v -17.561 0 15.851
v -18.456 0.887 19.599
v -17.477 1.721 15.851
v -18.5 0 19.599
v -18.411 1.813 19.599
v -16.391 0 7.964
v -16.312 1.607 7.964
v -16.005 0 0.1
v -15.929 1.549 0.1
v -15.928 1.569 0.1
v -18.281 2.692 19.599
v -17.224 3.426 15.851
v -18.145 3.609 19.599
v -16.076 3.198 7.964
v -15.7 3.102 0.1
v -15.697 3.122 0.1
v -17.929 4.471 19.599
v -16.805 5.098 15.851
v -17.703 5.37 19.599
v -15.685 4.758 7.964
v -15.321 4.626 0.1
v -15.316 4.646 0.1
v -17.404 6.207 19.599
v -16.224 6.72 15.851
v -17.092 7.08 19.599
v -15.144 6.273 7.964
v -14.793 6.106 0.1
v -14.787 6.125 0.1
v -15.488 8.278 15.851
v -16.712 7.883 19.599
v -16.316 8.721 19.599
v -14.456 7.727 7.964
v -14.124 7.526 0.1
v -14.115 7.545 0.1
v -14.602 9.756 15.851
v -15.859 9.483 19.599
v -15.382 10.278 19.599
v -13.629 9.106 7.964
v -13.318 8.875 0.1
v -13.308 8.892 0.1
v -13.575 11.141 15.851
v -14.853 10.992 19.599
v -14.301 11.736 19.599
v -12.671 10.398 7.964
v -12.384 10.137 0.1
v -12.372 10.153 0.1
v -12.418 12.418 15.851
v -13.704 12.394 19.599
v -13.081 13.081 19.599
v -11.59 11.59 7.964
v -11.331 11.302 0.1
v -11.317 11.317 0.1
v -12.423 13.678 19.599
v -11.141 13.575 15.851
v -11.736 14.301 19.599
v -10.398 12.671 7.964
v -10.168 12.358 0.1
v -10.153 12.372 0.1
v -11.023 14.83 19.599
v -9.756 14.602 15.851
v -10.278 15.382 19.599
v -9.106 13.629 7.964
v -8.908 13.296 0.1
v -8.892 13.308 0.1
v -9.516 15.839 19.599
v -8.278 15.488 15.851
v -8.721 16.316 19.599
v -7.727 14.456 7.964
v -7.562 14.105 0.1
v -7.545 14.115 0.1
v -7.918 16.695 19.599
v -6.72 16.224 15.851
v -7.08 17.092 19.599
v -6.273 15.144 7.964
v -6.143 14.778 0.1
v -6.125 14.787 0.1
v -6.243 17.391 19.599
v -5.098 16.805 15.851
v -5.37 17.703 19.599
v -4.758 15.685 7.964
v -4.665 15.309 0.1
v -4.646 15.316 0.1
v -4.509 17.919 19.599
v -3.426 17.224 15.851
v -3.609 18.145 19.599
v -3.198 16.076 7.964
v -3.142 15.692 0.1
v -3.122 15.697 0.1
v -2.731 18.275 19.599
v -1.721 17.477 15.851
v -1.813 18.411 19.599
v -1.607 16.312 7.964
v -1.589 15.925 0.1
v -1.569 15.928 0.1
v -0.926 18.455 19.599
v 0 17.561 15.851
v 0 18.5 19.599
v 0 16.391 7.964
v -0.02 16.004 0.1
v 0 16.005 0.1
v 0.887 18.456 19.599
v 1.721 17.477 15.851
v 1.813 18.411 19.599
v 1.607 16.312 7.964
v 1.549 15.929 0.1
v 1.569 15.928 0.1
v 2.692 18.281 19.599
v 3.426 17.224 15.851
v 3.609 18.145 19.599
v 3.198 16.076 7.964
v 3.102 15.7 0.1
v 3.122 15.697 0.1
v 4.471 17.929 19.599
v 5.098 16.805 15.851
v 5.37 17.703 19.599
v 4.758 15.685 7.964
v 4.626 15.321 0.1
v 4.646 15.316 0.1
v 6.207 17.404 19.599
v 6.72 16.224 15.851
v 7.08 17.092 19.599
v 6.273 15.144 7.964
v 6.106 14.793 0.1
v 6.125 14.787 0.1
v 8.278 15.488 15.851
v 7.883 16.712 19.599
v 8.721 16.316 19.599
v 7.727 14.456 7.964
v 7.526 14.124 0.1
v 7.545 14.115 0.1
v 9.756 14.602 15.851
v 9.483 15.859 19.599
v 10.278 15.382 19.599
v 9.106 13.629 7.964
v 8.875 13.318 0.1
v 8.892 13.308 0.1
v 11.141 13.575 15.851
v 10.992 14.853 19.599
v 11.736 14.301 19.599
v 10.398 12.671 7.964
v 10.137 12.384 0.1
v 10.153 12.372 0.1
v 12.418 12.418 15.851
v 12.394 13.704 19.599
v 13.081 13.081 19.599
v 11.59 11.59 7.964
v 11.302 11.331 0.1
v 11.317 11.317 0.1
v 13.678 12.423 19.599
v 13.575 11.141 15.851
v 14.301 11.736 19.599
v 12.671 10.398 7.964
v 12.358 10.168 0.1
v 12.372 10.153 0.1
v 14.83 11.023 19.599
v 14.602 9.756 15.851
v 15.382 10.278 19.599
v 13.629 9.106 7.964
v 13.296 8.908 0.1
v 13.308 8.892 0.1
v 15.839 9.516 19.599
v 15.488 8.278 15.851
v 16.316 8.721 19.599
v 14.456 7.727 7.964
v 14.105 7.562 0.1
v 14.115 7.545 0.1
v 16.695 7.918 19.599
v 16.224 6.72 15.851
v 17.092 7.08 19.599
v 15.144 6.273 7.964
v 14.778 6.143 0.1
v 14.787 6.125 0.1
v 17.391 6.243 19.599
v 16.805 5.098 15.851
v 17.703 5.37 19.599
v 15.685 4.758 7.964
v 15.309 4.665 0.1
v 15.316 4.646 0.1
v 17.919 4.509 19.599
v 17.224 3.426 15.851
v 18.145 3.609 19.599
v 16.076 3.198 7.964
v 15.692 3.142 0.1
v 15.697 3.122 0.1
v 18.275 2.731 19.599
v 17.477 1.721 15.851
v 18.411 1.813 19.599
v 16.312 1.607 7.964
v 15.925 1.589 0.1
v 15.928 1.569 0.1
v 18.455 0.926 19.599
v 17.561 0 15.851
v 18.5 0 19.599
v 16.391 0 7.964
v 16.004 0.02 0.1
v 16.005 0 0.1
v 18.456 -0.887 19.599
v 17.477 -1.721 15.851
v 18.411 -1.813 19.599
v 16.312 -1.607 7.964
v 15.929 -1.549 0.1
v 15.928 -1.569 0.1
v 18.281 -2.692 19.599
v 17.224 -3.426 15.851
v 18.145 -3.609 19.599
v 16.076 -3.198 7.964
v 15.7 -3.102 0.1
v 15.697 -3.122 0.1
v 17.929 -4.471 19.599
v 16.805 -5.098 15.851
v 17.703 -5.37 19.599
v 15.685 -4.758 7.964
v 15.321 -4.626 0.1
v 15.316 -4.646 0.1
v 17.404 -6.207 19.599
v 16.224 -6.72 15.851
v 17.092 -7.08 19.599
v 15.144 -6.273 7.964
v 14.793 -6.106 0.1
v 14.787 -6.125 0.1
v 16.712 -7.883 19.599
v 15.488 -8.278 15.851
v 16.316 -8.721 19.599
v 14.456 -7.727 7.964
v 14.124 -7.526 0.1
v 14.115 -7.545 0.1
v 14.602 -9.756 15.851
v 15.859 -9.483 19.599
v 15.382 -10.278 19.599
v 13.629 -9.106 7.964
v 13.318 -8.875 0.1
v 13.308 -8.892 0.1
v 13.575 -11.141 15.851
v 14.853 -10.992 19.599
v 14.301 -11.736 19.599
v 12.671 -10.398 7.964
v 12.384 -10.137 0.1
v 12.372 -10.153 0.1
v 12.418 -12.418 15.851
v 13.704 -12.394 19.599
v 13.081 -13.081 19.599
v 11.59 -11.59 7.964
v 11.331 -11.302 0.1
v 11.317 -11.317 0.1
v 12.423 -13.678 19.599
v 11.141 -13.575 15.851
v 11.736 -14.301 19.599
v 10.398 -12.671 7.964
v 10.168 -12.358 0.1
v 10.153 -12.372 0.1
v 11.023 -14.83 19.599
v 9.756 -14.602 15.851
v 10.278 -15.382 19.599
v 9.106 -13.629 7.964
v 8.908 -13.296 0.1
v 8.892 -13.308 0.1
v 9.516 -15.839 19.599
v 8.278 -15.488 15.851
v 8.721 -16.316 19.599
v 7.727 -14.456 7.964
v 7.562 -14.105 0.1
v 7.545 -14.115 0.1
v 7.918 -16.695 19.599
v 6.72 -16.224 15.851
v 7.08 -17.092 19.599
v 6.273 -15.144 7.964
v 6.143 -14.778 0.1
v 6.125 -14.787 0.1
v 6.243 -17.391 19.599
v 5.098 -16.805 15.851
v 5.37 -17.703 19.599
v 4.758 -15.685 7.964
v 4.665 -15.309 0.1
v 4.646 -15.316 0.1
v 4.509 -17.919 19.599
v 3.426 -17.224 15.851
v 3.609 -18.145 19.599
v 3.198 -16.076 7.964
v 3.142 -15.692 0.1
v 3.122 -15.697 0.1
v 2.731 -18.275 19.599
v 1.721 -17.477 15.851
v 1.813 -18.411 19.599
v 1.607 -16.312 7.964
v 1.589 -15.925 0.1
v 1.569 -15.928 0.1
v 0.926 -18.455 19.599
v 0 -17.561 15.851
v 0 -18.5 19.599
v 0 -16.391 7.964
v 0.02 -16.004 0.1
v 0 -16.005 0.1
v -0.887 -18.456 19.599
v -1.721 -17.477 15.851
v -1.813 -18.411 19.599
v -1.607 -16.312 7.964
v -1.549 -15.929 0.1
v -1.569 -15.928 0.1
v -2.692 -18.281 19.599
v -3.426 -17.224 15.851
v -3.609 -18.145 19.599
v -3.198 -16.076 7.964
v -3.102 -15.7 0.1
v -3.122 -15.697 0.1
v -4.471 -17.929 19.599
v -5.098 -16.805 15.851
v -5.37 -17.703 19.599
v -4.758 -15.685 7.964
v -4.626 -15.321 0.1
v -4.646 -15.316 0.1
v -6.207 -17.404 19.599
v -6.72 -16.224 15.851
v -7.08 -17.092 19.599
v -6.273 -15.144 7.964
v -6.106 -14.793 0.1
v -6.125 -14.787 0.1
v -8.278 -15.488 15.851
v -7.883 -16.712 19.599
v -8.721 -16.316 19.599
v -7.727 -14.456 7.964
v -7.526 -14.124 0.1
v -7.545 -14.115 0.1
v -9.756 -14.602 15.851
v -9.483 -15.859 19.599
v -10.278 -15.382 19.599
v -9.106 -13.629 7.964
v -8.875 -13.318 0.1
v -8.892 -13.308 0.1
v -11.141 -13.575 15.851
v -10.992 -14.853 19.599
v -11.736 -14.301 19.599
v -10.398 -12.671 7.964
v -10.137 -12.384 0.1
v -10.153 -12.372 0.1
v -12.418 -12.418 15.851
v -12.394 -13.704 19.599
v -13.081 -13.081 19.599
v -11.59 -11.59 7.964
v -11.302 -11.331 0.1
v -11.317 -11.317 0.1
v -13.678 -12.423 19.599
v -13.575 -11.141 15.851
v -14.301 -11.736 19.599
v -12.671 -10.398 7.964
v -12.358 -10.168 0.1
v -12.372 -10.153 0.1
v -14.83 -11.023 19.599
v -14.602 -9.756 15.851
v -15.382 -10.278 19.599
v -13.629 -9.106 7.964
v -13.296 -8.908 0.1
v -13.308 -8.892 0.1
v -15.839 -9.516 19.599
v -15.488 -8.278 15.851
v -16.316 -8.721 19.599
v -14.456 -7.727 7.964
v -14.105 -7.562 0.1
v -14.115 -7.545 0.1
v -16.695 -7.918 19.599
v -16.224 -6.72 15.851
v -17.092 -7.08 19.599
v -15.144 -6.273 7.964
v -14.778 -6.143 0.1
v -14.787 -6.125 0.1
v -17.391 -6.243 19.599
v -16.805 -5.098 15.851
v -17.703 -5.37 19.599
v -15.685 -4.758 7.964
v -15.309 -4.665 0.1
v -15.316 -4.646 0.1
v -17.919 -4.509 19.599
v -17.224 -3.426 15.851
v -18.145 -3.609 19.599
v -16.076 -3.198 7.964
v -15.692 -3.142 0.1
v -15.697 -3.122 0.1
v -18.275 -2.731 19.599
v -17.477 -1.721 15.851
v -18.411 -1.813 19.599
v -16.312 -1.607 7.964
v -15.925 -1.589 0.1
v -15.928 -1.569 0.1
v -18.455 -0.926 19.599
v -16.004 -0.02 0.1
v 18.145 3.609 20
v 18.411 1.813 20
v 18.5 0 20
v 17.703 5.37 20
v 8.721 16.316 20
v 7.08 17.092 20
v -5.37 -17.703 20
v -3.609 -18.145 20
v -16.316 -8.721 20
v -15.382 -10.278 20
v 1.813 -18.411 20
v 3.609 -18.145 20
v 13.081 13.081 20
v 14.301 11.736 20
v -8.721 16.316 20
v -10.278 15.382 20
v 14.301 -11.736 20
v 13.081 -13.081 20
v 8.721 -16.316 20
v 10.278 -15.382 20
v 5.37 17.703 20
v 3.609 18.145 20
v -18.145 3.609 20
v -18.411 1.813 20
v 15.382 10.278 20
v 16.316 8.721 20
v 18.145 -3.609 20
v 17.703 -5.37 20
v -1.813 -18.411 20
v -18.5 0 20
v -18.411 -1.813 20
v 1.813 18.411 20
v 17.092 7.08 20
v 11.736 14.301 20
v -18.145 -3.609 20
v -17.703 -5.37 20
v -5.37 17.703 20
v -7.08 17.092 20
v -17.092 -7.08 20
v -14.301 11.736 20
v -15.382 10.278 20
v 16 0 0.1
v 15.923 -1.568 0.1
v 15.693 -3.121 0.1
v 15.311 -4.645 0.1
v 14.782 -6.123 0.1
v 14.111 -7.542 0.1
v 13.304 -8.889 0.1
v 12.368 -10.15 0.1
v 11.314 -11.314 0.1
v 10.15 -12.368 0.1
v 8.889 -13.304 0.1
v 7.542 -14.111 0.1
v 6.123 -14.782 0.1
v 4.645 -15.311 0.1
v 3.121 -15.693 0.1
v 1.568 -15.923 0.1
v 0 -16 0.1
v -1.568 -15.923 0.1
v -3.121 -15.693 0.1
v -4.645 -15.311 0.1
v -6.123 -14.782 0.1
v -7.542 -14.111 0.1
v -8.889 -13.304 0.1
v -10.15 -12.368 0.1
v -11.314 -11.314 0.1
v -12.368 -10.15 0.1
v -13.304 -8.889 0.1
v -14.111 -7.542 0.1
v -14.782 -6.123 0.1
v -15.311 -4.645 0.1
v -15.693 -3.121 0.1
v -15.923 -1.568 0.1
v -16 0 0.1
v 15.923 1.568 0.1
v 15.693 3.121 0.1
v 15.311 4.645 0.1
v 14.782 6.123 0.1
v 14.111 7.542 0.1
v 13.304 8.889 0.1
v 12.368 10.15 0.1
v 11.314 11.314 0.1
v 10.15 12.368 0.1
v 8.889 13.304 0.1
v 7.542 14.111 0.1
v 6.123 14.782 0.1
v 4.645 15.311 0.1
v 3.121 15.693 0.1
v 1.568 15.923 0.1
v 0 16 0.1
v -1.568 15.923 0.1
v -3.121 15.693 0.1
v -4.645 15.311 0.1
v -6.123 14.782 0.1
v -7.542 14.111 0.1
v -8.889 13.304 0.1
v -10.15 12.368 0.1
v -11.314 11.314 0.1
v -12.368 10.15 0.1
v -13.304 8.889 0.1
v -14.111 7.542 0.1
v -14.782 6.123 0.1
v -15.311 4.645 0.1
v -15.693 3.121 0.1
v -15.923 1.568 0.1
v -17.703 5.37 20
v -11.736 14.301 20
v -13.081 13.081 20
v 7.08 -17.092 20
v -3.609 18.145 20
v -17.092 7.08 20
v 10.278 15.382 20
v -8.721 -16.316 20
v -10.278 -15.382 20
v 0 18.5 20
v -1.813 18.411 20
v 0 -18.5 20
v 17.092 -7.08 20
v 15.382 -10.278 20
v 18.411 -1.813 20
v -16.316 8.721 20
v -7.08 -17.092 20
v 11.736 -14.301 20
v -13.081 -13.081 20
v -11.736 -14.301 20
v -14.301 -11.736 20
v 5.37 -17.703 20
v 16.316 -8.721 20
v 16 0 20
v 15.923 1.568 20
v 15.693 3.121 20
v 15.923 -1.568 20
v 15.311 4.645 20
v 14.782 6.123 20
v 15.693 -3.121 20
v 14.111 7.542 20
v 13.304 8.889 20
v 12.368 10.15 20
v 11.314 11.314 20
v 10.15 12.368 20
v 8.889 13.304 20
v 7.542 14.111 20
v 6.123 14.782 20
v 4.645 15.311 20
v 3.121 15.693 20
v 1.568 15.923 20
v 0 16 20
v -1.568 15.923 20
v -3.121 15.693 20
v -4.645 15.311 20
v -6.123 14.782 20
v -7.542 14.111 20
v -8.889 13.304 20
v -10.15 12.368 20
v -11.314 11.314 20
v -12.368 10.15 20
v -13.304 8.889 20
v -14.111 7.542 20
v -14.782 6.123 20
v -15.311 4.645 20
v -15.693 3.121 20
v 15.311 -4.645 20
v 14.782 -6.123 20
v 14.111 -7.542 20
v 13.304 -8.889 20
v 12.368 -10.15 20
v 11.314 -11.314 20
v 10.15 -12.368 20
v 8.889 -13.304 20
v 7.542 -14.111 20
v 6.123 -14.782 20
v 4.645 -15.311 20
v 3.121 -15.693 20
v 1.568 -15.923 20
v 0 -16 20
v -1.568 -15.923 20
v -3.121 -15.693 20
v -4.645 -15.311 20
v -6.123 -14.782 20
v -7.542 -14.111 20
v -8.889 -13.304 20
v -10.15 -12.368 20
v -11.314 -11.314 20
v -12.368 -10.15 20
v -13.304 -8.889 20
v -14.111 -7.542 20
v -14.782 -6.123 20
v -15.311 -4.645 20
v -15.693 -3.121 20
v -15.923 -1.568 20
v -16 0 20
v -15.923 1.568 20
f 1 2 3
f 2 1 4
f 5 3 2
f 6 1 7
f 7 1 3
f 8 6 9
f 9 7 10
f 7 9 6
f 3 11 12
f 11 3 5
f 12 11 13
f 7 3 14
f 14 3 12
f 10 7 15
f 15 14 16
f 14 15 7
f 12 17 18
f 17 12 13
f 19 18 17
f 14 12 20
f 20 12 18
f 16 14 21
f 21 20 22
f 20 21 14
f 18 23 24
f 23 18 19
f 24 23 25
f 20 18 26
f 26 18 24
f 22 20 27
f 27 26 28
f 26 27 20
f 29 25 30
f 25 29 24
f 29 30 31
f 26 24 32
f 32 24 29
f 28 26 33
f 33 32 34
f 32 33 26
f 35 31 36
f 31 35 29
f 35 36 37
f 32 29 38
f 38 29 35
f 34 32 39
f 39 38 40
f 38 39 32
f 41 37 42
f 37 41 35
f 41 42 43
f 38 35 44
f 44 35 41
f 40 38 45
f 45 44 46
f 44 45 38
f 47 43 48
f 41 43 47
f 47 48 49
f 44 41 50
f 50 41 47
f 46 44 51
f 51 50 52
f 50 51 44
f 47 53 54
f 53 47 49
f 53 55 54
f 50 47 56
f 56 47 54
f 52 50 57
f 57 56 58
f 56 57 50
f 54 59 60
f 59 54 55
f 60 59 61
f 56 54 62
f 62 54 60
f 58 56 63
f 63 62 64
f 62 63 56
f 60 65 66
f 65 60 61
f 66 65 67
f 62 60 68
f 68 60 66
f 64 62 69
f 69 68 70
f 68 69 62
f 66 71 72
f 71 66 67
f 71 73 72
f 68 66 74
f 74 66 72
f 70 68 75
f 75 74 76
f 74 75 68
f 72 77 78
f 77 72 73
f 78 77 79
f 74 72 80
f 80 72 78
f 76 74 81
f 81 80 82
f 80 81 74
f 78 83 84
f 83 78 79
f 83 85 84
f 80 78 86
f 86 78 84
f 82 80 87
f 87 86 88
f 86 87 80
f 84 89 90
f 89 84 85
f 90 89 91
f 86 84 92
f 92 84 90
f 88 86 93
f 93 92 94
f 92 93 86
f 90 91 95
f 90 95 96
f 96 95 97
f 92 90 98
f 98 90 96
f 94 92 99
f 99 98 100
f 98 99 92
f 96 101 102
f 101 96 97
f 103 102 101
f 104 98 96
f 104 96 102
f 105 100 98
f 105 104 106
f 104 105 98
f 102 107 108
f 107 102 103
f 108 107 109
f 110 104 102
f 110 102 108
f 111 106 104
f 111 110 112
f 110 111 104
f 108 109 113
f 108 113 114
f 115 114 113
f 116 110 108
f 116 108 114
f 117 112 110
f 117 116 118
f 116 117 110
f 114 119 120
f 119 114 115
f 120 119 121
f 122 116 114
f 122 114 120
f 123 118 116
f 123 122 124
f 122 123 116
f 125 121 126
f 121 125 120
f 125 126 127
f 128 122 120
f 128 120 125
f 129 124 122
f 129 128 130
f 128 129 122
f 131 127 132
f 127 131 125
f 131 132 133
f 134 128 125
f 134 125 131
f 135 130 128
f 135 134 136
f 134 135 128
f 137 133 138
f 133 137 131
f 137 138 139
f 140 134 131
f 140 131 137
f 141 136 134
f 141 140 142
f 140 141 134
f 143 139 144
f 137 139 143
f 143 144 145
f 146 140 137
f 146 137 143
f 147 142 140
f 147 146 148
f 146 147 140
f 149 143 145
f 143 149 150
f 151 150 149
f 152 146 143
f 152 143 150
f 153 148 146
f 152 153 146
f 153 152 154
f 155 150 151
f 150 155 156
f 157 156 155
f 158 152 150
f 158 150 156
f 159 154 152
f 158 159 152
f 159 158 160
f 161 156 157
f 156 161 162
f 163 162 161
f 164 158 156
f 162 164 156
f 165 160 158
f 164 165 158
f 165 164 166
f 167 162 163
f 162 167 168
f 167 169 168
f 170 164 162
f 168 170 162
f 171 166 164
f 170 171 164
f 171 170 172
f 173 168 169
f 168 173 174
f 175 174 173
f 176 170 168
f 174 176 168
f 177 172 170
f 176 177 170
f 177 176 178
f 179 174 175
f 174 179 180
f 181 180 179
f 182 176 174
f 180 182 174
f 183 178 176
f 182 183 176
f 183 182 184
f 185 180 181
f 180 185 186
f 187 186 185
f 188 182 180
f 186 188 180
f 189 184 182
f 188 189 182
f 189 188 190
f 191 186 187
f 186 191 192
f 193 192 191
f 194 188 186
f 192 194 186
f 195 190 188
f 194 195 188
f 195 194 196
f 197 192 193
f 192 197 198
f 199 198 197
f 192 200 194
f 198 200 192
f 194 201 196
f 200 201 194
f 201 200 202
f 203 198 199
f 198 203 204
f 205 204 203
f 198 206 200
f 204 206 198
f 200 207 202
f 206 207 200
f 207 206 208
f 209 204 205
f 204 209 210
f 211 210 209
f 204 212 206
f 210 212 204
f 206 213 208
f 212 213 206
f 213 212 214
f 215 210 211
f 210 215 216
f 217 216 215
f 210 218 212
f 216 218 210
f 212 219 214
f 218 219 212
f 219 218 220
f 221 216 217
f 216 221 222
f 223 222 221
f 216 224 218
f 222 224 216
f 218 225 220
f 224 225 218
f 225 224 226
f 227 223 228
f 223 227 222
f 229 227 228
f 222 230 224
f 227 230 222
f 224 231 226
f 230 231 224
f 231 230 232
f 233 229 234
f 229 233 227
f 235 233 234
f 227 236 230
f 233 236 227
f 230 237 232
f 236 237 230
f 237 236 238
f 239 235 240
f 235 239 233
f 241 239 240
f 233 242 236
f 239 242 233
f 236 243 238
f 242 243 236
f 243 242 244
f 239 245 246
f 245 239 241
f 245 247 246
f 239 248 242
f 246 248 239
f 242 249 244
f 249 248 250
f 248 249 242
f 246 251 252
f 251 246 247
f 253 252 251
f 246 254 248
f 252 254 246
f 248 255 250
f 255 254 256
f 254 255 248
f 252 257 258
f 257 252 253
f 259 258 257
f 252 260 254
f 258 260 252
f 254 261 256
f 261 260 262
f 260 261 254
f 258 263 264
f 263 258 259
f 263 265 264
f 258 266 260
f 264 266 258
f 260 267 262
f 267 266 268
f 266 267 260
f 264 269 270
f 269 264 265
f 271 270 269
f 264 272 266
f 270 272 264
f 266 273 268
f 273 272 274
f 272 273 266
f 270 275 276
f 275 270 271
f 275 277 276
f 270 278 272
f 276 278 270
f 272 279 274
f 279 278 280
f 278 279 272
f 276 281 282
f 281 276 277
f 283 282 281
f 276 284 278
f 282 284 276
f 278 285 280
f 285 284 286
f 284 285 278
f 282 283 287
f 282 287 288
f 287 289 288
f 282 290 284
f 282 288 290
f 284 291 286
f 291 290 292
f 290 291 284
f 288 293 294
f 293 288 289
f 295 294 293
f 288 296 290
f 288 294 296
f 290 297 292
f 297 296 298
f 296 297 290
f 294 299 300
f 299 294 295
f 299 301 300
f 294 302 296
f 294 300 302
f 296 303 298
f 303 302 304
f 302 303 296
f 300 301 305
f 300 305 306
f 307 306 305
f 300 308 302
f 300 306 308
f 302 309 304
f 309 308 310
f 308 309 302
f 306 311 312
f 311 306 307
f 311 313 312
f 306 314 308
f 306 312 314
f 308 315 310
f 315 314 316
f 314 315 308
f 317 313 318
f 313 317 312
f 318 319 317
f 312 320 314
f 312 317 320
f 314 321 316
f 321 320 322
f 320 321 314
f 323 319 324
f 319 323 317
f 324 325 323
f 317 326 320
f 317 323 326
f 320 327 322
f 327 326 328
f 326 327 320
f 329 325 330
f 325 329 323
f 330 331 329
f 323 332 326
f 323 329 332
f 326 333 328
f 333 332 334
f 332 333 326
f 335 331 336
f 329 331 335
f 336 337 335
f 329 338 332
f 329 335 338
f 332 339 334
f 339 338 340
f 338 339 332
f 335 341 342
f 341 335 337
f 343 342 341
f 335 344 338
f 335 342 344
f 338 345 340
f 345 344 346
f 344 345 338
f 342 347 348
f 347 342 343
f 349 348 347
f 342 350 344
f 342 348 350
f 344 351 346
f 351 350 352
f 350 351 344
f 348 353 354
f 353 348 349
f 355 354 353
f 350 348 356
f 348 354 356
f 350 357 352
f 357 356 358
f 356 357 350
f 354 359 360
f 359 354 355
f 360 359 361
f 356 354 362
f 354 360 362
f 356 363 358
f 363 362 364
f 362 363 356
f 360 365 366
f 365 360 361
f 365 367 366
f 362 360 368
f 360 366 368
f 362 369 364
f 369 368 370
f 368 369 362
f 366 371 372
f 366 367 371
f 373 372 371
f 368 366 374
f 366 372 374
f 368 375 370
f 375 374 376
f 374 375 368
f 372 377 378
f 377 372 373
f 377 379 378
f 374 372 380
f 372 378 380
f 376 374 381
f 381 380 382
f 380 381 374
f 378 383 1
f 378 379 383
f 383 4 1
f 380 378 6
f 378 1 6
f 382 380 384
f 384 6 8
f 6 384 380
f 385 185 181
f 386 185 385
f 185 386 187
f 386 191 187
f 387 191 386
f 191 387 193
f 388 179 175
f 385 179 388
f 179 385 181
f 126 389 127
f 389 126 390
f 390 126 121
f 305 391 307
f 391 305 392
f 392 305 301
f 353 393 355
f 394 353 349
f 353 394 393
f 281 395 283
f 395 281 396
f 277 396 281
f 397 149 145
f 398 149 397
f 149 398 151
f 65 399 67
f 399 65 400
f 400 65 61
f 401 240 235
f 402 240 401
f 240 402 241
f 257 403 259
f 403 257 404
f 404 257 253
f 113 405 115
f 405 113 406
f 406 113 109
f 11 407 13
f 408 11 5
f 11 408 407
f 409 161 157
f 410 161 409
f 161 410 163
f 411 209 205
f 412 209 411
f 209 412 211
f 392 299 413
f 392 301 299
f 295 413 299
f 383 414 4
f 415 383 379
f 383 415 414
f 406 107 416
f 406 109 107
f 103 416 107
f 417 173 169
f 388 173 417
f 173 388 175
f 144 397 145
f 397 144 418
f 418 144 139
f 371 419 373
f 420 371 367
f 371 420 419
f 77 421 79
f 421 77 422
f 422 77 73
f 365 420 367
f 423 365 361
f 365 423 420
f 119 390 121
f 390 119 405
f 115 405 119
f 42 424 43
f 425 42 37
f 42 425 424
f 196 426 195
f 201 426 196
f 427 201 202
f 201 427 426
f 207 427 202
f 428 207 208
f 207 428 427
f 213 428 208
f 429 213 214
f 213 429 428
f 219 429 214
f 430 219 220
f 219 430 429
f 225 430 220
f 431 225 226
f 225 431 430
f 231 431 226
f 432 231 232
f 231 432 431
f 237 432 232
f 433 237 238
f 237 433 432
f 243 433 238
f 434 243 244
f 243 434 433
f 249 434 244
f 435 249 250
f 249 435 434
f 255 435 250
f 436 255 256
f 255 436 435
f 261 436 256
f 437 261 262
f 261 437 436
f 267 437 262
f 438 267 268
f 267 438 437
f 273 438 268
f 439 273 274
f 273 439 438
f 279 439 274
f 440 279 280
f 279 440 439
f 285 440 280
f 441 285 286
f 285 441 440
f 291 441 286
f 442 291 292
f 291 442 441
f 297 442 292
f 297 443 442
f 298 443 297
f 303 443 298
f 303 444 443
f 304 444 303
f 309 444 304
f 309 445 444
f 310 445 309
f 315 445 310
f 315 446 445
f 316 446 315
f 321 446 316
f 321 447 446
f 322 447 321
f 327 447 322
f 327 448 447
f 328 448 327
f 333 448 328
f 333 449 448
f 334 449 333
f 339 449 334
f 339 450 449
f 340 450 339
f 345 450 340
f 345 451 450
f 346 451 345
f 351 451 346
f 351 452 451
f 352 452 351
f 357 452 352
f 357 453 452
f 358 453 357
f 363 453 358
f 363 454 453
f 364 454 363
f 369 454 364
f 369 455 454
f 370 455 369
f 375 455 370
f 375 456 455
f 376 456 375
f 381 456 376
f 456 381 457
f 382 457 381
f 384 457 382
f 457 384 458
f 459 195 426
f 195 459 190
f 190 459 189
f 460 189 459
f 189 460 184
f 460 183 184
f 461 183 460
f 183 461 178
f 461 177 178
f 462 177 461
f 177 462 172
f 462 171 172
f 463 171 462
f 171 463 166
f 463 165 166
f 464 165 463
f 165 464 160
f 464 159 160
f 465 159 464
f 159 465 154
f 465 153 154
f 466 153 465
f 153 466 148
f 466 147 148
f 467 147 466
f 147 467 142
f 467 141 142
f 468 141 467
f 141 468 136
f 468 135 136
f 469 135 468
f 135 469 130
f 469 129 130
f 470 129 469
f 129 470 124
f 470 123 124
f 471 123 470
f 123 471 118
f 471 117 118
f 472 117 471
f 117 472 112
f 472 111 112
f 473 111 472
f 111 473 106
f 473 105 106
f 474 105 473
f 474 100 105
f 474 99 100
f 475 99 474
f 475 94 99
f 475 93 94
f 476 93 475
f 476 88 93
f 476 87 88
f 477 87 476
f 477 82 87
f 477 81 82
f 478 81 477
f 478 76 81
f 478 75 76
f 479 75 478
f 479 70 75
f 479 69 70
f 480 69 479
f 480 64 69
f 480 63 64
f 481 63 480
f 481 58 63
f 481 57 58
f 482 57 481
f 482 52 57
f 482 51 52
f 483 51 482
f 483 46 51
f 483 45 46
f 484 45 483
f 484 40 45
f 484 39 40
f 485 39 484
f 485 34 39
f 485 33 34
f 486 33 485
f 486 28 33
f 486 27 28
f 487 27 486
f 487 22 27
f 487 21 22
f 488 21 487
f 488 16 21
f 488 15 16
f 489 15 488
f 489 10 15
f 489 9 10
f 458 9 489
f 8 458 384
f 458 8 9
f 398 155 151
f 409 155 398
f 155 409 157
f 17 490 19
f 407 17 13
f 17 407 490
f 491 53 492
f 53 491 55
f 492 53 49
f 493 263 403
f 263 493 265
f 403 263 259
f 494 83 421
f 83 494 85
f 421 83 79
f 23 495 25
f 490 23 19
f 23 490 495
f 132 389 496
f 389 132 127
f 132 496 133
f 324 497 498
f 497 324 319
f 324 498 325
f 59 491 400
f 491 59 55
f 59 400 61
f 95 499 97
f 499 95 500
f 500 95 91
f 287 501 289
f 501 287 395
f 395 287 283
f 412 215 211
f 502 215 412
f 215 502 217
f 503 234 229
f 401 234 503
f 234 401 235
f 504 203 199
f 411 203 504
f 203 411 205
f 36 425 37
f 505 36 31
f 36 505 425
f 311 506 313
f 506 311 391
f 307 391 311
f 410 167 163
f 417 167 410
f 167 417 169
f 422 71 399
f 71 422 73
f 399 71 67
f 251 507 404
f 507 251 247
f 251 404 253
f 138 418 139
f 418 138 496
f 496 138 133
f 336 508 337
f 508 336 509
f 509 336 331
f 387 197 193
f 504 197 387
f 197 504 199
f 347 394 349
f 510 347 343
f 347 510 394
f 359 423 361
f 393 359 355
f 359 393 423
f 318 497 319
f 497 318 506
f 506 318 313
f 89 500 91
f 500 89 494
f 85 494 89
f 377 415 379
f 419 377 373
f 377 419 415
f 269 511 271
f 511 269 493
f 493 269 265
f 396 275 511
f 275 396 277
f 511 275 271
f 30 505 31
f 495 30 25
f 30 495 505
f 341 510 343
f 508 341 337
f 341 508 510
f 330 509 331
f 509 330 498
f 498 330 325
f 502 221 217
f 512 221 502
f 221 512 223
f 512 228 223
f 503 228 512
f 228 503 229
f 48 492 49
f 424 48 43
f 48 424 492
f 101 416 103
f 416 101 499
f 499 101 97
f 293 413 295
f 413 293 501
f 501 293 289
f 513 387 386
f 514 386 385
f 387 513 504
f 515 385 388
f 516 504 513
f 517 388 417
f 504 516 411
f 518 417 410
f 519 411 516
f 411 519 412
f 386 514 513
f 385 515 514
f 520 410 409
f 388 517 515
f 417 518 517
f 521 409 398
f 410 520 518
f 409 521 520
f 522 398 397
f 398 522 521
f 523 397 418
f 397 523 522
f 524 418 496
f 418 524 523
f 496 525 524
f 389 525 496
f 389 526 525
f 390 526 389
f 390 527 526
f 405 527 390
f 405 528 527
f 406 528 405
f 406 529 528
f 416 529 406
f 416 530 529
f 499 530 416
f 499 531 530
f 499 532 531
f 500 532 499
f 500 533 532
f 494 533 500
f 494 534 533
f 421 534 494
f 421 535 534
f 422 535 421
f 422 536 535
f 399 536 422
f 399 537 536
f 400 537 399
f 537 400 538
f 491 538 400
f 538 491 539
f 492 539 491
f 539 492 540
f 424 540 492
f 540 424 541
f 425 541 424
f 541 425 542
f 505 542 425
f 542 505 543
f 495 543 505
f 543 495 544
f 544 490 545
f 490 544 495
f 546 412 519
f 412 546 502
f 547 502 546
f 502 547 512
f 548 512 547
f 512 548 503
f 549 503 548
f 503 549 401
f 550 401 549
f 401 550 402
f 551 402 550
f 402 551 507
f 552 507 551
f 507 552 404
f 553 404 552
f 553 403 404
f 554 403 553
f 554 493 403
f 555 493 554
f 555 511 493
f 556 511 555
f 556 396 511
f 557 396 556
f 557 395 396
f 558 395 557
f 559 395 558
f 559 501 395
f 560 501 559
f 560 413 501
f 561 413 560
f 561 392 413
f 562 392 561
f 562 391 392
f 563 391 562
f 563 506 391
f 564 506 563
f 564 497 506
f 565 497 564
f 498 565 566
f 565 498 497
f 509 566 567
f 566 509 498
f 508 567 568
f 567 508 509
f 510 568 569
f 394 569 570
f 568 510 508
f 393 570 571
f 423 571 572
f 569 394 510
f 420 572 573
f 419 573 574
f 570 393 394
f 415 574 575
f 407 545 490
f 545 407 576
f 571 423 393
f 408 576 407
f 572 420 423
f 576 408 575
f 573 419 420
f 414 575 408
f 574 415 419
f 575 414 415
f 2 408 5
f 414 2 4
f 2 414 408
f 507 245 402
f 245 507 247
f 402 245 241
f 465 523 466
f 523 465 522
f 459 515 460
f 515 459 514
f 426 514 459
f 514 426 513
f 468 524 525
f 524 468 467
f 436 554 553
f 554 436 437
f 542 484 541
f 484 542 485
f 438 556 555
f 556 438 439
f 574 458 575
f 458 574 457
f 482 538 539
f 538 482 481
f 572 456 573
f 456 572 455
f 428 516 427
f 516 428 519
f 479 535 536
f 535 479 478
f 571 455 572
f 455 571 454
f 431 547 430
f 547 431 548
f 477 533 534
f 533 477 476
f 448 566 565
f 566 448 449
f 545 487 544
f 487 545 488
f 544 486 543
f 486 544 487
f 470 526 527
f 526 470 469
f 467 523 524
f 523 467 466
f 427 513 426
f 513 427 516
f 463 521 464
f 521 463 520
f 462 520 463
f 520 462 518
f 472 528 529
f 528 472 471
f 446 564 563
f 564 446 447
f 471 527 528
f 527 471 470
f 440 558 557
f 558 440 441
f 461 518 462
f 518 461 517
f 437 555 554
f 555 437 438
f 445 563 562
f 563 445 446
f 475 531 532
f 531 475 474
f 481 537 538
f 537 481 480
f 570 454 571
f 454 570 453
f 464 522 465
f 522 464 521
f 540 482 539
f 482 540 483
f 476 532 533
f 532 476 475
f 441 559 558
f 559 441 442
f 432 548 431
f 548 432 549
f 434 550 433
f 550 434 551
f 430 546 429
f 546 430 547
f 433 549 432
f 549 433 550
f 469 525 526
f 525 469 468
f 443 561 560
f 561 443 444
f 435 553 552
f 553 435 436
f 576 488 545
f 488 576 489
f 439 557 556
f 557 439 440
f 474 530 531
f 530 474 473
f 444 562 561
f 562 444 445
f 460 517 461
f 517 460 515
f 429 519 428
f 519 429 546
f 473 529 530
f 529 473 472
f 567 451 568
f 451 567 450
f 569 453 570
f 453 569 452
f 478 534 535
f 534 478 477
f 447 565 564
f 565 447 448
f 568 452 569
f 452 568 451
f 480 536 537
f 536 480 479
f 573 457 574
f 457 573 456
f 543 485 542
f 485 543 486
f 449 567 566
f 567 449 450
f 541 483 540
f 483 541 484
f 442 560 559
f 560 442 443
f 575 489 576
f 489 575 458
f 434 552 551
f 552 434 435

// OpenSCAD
$fn=64;
x = 2.5;
y = 20;
rad_circle = (x*x + y*y) / (2*x);
tube_r = 16;
xy_cube = (rad_circle*2+tube_r)*2;
extra = 0.1;

function uta_x() = x;
function uta_y() = y;

module uta_torus()
{
    rotate_extrude()
        translate([rad_circle+tube_r, 0, 0])
            circle(r=rad_circle);
}

module uta_cut_cube(z)
{
    translate([0,0,z])
        cube([xy_cube,xy_cube,rad_circle], center=true);
}

module uta_cut()
{
    difference()
    {
        uta_torus();
        uta_cut_cube(-rad_circle/2);
    }
}

module uta_main()
{
    difference ()
    {
        translate([0,0,extra])
            cylinder(h = y-extra, r = tube_r+x);
        cylinder(h = y+extra, r = tube_r);
        uta_cut();
    }
}

uta_main();
